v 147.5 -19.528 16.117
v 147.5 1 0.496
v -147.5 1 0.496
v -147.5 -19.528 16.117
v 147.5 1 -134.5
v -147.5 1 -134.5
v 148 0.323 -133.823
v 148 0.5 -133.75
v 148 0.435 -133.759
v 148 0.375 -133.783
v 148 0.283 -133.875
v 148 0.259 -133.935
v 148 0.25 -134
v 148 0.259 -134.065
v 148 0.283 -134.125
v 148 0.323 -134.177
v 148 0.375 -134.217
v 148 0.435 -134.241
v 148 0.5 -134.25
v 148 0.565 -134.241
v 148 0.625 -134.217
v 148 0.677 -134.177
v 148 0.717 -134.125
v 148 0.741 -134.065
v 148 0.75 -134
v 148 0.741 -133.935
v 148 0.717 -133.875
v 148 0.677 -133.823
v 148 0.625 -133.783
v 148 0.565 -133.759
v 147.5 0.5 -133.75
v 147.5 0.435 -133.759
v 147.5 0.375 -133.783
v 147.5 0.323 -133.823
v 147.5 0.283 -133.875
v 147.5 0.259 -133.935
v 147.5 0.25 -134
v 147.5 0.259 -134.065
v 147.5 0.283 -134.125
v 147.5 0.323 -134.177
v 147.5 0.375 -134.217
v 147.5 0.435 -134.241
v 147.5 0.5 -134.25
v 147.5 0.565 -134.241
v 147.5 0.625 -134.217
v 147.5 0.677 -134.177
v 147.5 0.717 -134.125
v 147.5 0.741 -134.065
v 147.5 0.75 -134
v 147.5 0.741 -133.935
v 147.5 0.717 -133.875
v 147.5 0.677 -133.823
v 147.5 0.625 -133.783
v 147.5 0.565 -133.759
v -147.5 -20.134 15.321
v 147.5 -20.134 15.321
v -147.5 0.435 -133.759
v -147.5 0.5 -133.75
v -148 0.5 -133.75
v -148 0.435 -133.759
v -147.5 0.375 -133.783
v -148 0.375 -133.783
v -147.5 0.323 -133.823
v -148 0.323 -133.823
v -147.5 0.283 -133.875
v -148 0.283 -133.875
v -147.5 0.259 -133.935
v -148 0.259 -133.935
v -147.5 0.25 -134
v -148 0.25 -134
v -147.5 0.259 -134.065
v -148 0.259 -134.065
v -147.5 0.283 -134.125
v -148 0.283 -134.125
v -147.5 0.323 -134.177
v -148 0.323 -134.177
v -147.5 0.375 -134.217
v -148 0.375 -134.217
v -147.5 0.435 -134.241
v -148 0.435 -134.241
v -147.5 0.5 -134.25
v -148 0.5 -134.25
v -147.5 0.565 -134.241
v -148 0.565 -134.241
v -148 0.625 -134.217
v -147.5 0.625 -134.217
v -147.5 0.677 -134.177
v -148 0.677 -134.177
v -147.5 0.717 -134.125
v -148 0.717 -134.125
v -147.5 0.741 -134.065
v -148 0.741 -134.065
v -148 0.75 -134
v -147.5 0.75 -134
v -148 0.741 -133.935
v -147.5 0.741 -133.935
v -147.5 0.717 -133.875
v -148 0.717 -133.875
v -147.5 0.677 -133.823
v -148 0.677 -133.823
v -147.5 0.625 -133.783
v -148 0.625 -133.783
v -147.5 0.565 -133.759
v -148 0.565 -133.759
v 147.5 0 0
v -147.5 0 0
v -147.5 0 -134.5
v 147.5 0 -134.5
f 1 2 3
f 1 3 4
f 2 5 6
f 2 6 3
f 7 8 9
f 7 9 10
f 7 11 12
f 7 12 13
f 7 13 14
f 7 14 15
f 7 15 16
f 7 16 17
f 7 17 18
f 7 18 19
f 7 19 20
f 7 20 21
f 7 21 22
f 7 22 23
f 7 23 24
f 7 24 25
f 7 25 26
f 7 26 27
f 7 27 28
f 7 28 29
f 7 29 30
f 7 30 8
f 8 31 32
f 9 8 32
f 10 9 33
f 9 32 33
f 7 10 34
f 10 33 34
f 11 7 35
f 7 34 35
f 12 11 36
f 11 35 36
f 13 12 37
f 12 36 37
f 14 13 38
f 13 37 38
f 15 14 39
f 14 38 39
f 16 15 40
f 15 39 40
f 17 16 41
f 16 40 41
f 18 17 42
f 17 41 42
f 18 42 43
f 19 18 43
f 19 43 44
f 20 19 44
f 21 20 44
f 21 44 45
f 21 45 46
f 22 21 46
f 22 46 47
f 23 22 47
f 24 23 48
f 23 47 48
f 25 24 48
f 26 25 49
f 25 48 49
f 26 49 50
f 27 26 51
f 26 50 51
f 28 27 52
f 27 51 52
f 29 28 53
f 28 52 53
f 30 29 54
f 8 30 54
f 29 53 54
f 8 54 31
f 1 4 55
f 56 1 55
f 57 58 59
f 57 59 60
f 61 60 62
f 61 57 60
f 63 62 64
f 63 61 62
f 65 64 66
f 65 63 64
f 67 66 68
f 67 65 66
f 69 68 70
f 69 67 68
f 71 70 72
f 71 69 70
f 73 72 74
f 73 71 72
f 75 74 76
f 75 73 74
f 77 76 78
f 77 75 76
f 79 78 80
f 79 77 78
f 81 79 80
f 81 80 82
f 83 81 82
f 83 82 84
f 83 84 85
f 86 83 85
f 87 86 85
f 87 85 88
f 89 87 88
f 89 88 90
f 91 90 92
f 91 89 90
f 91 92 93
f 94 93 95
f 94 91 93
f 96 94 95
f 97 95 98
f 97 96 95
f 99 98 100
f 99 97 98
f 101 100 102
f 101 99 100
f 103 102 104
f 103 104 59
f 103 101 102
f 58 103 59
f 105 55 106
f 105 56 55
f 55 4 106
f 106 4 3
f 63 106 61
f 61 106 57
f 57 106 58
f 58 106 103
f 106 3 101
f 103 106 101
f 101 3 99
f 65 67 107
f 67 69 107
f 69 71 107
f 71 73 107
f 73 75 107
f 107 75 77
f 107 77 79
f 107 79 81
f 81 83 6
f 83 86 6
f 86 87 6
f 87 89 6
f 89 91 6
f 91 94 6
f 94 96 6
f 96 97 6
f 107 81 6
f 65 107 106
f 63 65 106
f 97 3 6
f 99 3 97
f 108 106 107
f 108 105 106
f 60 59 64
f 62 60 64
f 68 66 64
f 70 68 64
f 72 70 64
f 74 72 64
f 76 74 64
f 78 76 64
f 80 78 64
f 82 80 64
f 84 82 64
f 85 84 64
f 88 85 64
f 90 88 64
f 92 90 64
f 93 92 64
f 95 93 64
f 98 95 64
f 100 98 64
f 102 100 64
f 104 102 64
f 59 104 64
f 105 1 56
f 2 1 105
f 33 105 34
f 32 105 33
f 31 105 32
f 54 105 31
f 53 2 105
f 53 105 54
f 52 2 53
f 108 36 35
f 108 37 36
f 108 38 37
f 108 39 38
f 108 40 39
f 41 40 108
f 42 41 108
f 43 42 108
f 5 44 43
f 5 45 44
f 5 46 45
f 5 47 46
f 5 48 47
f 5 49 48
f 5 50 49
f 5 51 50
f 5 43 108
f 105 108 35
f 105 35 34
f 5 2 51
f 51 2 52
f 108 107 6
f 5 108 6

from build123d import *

# Parameters (mm, degrees)
SALIENTE_EXTRUIR1_DEPTH = 147.5
CROQUIS2_R              = 0.25
SALIENTE_EXTRUIR2_DEPTH = 0.5


with BuildPart() as part:
    # Croquis1 → Saliente-Extruir1 (new body)
    with BuildSketch(Plane(origin=(0, 0, 0), x_dir=(0, 0, -1), z_dir=(1, 0, 0))):
        Polygon((0, 0), (134.5, 0), (134.5, 1), (-0.495643149, 1), (-16.116757416, -19.527932056), (-15.320966749, -20.133503865), align=None)
    extrude(amount=SALIENTE_EXTRUIR1_DEPTH)

    # Croquis2 → Saliente-Extruir2 (add)
    with BuildSketch(Plane(origin=(147.5, 0, 0), x_dir=(0, 0, -1), z_dir=(1, 0, 0))):
        with Locations(Location((134, 0.5, 0), (0, 0, 180))):
            Circle(CROQUIS2_R)
    extrude(amount=SALIENTE_EXTRUIR2_DEPTH)

    # Simetría1: part across plane


with BuildPart() as part_1:
    add(part.part)
    add(part.part.mirror(Plane.ZY))


solid = part_1.part
